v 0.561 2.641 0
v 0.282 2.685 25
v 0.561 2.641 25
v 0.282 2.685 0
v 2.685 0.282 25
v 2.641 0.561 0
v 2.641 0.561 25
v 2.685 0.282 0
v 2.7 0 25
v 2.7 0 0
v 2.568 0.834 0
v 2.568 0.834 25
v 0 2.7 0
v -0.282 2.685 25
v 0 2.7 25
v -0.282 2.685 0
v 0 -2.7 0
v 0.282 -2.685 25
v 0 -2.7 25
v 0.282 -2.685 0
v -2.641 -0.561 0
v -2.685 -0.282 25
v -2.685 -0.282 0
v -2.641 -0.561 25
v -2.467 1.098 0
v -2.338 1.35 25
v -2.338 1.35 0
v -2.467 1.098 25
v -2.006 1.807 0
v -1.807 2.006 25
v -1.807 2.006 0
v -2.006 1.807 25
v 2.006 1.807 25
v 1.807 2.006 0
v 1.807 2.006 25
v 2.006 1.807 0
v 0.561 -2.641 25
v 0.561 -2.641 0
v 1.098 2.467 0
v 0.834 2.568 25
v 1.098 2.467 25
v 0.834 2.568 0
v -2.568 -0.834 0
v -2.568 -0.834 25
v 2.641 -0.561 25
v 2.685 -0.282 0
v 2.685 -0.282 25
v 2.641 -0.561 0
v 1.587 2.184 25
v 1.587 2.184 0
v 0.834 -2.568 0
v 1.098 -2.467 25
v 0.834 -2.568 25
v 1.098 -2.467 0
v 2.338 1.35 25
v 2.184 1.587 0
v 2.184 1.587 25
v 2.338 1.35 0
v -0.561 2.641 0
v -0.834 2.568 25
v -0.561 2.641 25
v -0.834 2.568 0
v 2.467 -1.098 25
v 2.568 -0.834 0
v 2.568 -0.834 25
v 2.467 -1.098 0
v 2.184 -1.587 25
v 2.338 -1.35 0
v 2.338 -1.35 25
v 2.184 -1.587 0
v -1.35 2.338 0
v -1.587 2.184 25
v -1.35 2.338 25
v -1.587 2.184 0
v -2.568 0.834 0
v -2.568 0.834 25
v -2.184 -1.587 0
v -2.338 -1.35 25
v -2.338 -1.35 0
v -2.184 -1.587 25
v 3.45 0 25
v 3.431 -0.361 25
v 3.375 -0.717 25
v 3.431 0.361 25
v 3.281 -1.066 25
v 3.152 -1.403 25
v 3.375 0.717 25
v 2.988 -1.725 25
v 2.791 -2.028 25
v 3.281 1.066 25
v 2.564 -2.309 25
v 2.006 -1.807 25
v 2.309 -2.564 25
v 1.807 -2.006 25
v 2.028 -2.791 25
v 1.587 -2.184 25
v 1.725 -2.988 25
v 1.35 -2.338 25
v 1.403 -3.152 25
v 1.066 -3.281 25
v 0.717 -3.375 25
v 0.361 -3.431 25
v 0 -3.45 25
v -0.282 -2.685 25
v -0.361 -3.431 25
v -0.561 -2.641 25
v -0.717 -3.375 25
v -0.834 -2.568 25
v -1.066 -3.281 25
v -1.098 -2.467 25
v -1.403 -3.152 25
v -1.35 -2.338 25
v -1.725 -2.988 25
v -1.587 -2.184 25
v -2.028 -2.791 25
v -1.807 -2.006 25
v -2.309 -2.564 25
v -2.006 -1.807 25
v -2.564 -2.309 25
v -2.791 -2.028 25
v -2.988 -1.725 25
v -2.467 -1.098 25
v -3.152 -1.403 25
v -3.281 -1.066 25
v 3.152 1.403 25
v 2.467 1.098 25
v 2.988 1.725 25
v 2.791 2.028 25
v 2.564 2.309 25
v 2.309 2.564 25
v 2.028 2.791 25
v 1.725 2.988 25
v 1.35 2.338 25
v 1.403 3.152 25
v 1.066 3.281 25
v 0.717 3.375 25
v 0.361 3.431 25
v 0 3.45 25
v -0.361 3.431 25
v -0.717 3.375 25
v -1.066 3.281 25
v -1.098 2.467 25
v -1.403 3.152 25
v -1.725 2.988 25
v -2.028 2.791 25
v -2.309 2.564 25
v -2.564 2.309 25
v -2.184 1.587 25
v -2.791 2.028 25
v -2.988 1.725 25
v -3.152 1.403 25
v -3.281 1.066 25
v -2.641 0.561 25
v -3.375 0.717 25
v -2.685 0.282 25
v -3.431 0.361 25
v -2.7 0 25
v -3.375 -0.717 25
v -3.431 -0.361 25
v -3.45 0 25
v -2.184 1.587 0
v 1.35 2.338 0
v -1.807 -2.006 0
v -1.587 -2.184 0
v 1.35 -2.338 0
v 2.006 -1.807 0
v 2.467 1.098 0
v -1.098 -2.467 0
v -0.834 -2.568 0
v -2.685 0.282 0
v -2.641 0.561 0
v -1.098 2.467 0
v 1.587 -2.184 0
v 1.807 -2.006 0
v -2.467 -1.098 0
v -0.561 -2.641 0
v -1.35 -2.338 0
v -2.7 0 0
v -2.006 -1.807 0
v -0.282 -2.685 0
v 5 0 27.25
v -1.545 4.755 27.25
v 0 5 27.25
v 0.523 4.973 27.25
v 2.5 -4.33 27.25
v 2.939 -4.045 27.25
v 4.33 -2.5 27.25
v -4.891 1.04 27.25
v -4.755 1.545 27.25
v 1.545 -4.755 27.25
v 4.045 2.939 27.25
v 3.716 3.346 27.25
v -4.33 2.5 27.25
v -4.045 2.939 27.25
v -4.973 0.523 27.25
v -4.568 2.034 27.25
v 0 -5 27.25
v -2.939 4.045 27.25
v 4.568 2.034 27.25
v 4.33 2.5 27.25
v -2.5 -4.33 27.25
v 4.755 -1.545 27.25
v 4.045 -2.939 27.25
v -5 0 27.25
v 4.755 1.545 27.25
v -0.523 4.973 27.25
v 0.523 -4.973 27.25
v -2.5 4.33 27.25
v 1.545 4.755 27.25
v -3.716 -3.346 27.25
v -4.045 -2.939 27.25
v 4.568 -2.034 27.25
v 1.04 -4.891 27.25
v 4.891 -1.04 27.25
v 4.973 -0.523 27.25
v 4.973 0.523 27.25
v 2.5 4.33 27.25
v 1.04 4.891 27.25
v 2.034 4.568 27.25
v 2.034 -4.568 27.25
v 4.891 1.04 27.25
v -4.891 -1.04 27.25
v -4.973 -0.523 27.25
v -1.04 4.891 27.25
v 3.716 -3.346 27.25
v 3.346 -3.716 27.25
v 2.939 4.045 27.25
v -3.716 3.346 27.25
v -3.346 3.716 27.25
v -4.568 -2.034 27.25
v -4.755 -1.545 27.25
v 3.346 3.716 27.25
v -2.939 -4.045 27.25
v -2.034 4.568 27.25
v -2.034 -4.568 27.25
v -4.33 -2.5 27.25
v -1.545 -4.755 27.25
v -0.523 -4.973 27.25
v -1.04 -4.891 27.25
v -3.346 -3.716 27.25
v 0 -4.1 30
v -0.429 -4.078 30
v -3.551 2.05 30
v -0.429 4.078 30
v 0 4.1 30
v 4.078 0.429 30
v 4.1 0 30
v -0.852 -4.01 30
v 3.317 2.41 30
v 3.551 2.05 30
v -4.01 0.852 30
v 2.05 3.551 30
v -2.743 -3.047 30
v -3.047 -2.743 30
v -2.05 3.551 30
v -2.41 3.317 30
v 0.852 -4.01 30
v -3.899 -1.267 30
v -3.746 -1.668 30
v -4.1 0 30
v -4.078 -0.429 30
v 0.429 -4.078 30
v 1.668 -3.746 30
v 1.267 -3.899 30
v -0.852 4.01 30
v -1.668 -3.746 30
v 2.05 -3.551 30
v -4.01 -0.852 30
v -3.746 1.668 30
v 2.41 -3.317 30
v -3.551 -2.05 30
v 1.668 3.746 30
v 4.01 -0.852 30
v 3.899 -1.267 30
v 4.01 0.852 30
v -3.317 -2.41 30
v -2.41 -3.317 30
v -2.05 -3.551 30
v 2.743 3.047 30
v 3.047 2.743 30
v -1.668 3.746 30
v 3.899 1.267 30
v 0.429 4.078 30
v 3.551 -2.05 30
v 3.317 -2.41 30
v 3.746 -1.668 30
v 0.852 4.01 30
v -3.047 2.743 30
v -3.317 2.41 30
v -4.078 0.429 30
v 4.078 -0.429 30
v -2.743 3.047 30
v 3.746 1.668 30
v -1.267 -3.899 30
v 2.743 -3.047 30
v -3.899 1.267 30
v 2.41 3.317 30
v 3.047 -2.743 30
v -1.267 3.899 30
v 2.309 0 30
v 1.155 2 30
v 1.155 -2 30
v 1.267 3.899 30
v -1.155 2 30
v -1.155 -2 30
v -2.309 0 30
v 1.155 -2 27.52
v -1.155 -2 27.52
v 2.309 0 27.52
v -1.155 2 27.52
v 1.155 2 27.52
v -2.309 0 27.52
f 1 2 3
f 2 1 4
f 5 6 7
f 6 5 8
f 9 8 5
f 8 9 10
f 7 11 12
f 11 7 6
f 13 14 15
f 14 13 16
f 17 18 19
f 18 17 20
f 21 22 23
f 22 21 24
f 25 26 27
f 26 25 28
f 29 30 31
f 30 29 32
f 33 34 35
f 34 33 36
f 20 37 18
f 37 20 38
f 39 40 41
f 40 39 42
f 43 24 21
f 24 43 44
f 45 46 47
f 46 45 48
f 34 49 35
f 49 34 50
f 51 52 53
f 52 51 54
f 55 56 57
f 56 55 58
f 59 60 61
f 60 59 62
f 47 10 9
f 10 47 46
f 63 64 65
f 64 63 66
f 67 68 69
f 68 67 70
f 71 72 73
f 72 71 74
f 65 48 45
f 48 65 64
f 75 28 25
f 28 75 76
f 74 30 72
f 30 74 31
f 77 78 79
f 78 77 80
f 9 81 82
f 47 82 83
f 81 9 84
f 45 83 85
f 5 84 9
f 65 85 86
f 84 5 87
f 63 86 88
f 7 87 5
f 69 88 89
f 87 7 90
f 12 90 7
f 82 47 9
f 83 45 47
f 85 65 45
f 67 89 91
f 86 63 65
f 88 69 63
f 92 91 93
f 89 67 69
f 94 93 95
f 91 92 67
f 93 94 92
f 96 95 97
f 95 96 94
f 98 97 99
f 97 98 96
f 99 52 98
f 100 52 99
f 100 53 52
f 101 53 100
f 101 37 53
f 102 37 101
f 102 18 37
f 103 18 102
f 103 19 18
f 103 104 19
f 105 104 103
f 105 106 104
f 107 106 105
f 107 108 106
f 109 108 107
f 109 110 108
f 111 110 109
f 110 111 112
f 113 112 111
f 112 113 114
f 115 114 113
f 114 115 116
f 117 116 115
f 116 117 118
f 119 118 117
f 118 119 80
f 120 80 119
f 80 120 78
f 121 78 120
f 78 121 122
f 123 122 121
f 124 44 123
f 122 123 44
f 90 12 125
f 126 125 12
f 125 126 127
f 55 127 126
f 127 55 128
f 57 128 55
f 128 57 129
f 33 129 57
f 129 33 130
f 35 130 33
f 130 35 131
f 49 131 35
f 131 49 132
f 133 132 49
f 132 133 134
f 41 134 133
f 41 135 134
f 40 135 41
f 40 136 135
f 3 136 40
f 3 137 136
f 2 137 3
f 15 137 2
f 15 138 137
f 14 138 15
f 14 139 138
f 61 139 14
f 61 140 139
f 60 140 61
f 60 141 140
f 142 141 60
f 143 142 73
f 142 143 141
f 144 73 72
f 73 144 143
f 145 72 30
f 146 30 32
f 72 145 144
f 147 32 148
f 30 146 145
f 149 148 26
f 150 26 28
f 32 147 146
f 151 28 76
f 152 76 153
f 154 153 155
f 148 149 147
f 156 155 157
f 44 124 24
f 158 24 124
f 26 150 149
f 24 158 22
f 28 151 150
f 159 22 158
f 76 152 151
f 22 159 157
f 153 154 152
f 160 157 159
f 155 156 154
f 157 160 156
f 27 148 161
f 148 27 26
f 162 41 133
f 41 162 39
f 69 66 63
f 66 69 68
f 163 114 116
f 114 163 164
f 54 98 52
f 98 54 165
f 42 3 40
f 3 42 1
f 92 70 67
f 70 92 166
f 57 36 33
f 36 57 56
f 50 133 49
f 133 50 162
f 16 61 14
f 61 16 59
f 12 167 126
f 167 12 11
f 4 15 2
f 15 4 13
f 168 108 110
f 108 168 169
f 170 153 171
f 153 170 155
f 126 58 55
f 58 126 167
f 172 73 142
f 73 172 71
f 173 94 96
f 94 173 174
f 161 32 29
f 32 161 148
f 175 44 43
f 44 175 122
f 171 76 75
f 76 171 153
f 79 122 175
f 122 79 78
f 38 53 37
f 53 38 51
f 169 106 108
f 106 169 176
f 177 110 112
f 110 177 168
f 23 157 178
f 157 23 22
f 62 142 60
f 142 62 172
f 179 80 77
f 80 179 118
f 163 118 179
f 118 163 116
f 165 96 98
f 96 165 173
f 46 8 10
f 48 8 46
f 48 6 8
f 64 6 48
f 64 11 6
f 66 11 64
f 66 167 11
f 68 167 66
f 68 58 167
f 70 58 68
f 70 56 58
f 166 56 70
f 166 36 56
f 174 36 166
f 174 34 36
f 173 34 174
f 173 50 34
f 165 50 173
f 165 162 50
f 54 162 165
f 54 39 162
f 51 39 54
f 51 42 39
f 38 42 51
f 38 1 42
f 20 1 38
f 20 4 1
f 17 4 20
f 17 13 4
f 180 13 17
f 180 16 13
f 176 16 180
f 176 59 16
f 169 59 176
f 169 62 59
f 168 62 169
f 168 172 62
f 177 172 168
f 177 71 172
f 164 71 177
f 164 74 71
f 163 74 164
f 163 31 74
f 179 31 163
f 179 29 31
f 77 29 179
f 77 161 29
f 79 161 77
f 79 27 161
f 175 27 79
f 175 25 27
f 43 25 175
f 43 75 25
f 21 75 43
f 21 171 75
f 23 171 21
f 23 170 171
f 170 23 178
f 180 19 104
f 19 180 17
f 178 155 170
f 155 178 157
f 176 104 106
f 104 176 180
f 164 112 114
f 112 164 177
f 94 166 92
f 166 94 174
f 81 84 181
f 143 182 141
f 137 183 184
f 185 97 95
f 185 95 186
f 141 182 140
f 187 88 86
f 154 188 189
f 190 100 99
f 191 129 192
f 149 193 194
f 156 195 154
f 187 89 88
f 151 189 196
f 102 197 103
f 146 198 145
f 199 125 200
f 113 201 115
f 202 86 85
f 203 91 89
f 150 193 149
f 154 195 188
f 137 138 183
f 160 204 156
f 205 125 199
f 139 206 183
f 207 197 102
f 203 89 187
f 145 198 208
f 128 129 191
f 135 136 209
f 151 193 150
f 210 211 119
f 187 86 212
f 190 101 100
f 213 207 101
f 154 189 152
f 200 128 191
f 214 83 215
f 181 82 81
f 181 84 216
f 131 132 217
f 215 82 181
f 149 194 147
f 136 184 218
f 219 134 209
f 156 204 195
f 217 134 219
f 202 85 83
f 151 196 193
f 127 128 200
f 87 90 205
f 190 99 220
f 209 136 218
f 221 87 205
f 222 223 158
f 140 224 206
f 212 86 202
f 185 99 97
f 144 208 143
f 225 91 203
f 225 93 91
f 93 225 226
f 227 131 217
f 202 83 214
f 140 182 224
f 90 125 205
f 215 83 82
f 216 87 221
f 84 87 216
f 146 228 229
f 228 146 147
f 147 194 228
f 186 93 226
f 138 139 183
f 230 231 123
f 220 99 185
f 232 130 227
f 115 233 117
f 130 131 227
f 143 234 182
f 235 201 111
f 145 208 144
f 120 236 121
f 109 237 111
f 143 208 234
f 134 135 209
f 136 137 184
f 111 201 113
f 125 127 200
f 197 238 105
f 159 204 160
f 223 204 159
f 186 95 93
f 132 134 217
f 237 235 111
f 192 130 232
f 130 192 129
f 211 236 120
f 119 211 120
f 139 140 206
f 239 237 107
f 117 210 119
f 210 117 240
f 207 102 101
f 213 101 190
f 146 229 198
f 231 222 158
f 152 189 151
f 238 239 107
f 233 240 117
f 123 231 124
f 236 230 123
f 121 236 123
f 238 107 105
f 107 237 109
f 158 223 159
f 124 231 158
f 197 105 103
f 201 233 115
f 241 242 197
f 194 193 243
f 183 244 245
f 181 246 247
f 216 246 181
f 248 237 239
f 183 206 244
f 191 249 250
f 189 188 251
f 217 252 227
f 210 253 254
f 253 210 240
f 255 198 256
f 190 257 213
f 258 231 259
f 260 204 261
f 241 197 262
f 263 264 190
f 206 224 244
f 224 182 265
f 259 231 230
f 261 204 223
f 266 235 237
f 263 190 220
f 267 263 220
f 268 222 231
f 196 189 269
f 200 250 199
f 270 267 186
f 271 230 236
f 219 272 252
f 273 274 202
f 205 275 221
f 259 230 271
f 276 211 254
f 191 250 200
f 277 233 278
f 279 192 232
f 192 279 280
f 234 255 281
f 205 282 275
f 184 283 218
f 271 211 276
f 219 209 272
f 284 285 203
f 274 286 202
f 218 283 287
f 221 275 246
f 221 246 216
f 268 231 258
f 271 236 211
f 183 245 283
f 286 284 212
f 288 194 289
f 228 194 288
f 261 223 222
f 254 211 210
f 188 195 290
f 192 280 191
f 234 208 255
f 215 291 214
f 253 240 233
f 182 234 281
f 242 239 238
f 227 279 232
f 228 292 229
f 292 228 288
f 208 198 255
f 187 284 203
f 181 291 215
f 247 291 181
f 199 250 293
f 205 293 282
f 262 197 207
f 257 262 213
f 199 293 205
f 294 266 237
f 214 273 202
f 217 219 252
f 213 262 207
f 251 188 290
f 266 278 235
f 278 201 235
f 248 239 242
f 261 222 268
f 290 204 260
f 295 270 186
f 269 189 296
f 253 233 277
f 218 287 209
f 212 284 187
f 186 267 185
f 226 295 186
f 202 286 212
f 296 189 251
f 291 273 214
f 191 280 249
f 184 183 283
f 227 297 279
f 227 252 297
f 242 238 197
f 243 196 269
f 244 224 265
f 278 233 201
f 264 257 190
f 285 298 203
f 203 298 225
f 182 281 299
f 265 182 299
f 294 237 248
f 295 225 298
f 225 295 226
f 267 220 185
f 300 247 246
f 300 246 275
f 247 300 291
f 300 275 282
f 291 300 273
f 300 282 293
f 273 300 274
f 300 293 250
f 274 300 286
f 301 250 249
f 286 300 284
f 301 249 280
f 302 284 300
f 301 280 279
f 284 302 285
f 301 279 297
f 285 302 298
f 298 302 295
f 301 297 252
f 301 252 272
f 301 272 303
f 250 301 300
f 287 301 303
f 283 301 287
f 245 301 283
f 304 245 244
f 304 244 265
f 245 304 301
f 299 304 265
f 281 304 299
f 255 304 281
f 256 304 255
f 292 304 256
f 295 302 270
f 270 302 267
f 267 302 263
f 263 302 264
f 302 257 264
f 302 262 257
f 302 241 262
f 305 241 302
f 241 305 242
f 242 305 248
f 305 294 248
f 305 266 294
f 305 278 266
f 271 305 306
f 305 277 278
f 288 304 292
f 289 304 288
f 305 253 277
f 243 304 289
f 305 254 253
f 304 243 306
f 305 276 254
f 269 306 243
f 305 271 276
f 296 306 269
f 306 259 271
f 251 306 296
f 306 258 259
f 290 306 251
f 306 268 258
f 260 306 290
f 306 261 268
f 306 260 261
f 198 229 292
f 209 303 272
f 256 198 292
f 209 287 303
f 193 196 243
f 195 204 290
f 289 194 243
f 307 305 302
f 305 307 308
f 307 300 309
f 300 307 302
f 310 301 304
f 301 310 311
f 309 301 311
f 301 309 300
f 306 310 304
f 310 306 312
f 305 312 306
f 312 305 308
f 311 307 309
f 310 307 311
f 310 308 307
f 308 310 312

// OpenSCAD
// Low-profile button-head screw.
$fn = 60;
eps = 0.02;
shaft_d = 5.4;
head_d = 10;
head_h = 5;
shaft_l = 25;
socket_flat = head_d * 0.40;
difference() {
    union() {
        cylinder(d = shaft_d, h = shaft_l);
        translate([0, 0, shaft_l]) cylinder(d1 = shaft_d + 1.5, d2 = head_d, h = head_h * 0.45);
        translate([0, 0, shaft_l + head_h * 0.45]) cylinder(d1 = head_d, d2 = head_d * 0.82, h = head_h * 0.55);
    }
    translate([0, 0, shaft_l + head_h - head_h * 0.5 + eps])
        cylinder(d = socket_flat / cos(30), h = head_h * 0.5 + eps, $fn = 6);
}
